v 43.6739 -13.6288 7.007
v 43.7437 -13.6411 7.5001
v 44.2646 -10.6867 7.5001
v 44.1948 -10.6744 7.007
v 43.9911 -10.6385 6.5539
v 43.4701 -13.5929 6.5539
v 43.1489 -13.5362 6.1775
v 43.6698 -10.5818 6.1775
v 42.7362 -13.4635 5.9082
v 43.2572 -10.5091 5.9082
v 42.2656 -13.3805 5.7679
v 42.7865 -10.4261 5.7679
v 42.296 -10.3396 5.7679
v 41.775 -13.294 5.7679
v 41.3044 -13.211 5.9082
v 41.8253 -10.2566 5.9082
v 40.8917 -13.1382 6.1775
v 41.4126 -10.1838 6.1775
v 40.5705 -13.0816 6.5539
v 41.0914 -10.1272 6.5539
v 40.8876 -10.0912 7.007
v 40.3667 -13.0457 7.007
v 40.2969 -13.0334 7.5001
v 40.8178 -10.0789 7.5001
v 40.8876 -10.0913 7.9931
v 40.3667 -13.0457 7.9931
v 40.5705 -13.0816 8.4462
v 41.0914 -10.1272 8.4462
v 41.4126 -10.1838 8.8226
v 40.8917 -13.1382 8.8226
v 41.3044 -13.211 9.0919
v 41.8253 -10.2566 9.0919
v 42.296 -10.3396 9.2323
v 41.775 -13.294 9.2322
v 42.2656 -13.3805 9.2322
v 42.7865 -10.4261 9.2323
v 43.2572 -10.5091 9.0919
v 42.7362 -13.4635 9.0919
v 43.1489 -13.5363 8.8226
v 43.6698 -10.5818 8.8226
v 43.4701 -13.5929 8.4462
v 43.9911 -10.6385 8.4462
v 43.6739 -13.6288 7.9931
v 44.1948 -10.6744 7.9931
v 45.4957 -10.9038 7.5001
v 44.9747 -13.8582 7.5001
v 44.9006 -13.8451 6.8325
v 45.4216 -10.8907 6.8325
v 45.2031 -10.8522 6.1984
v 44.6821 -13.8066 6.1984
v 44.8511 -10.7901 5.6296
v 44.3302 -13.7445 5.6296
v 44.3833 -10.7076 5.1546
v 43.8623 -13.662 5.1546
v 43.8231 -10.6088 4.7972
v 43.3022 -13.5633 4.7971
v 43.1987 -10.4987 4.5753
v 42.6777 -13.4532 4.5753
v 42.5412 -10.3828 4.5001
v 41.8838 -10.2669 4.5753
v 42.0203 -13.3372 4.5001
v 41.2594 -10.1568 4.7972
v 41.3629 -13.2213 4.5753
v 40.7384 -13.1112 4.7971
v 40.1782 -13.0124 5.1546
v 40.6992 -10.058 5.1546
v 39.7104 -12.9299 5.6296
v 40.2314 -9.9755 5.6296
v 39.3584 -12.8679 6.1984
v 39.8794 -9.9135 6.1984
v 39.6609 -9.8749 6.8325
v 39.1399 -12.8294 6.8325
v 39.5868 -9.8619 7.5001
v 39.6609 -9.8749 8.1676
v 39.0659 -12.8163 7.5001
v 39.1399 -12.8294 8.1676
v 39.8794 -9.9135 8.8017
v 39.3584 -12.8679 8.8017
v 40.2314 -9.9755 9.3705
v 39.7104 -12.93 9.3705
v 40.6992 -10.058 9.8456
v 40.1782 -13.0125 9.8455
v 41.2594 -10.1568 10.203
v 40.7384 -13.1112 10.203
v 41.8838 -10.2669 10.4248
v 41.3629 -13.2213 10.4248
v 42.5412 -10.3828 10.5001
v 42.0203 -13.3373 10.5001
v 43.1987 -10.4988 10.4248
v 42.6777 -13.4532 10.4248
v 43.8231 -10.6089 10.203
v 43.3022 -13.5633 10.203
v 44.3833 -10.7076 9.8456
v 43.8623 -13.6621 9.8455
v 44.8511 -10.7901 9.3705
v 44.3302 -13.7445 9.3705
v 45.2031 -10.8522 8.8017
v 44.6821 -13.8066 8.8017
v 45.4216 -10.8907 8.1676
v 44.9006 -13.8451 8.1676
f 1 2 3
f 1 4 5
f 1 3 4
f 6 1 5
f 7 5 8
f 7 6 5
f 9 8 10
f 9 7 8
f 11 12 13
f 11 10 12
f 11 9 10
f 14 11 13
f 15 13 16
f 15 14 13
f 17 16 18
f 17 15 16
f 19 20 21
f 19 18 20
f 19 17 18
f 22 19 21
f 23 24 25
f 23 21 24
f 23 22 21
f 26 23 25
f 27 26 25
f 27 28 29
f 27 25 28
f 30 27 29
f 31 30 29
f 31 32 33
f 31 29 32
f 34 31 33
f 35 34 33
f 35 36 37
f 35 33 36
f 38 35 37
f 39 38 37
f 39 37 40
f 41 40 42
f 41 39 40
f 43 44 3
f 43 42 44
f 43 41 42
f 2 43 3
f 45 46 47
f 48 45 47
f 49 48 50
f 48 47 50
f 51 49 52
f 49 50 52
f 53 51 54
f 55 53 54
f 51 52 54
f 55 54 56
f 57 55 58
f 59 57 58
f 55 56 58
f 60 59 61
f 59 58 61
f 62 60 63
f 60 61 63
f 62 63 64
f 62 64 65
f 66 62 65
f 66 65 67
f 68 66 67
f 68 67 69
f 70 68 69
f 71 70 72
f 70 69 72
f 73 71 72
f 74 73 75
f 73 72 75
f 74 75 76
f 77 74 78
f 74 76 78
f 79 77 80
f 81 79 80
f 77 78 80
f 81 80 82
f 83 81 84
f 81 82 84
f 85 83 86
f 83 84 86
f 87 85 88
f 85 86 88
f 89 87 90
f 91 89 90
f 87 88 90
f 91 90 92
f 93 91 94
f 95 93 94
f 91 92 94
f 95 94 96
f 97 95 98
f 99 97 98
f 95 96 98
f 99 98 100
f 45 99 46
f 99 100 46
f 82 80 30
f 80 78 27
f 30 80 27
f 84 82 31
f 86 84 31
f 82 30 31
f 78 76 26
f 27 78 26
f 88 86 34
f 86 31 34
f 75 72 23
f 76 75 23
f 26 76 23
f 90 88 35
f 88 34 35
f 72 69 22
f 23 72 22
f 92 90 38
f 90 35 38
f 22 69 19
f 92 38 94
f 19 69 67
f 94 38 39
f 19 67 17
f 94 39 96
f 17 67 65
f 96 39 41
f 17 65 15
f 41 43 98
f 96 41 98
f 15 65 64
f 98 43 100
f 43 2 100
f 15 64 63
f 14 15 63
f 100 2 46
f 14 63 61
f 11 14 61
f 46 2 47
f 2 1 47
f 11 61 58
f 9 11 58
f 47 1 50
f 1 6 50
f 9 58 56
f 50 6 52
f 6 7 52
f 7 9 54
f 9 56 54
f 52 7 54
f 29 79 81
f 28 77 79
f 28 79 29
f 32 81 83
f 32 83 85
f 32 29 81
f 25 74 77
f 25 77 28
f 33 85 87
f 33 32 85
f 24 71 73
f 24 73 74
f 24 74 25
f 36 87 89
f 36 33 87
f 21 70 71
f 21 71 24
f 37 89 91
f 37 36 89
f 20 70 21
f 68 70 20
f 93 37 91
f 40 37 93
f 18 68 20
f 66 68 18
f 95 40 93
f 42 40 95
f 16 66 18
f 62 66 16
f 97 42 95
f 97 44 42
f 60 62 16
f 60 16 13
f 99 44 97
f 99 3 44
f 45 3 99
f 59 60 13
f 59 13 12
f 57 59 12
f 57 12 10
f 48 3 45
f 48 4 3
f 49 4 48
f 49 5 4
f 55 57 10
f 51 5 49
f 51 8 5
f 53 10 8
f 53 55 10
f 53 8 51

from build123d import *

# Parameters (mm, degrees)
CYLINDER044_R               = 1.75
CYLINDER044_DEPTH           = 18
CYLINDER044_ROLL_ANGLE      = -89.999776
CYLINDER044_PITCH_ANGLE     = 1.4e-05
CYLINDER044_PLACEMENT_ANGLE = -9.999925
CYLINDER045_R               = 3
CYLINDER045_DEPTH           = 3
CYLINDER045_ROLL_ANGLE      = -89.999776
CYLINDER045_PITCH_ANGLE     = 1.4e-05
CYLINDER045_PLACEMENT_ANGLE = -9.999925


with BuildPart() as cylinder044:
    # Cylinder044 → Cylinder044 (new body)
    with BuildSketch(Plane.XY):
        Circle(CYLINDER044_R)
    extrude(amount=CYLINDER044_DEPTH)


with BuildPart() as cylinder044_1:
    # Cylinder044 roll: moved
    add(cylinder044.part.rotate(Axis((0, 0, 0), (1, 0, 0)), CYLINDER044_ROLL_ANGLE))


with BuildPart() as cylinder044_2:
    # Cylinder044 pitch: moved
    add(cylinder044_1.part.rotate(Axis((0, 0, 0), (0, 1, 0)), CYLINDER044_PITCH_ANGLE))


with BuildPart() as cylinder044_3:
    # Cylinder044 placement: moved
    add(cylinder044_2.part.moved(Location((39.936529, -25.15494, 7.500007))).rotate(Axis((39.936529, -25.15494, 7.500007), (0, 0, 1)), CYLINDER044_PLACEMENT_ANGLE))


with BuildPart() as cut037:
    # Cylinder045 → Cylinder045 (new body)
    with BuildSketch(Plane.XY):
        Circle(CYLINDER045_R)
    extrude(amount=CYLINDER045_DEPTH)


with BuildPart() as cut037_1:
    # Cylinder045 roll: moved
    add(cut037.part.rotate(Axis((0, 0, 0), (1, 0, 0)), CYLINDER045_ROLL_ANGLE))


with BuildPart() as cut037_2:
    # Cylinder045 pitch: moved
    add(cut037_1.part.rotate(Axis((0, 0, 0), (0, 1, 0)), CYLINDER045_PITCH_ANGLE))


with BuildPart() as cut037_3:
    # Cylinder045 placement: moved
    add(cut037_2.part.moved(Location((42.020292, -13.337245, 7.500054))).rotate(Axis((42.020292, -13.337245, 7.500054), (0, 0, 1)), CYLINDER045_PLACEMENT_ANGLE))

    # Cut037: cut Cylinder044
    add(cylinder044_3.part, mode=Mode.SUBTRACT)


solid = cut037_3.part
